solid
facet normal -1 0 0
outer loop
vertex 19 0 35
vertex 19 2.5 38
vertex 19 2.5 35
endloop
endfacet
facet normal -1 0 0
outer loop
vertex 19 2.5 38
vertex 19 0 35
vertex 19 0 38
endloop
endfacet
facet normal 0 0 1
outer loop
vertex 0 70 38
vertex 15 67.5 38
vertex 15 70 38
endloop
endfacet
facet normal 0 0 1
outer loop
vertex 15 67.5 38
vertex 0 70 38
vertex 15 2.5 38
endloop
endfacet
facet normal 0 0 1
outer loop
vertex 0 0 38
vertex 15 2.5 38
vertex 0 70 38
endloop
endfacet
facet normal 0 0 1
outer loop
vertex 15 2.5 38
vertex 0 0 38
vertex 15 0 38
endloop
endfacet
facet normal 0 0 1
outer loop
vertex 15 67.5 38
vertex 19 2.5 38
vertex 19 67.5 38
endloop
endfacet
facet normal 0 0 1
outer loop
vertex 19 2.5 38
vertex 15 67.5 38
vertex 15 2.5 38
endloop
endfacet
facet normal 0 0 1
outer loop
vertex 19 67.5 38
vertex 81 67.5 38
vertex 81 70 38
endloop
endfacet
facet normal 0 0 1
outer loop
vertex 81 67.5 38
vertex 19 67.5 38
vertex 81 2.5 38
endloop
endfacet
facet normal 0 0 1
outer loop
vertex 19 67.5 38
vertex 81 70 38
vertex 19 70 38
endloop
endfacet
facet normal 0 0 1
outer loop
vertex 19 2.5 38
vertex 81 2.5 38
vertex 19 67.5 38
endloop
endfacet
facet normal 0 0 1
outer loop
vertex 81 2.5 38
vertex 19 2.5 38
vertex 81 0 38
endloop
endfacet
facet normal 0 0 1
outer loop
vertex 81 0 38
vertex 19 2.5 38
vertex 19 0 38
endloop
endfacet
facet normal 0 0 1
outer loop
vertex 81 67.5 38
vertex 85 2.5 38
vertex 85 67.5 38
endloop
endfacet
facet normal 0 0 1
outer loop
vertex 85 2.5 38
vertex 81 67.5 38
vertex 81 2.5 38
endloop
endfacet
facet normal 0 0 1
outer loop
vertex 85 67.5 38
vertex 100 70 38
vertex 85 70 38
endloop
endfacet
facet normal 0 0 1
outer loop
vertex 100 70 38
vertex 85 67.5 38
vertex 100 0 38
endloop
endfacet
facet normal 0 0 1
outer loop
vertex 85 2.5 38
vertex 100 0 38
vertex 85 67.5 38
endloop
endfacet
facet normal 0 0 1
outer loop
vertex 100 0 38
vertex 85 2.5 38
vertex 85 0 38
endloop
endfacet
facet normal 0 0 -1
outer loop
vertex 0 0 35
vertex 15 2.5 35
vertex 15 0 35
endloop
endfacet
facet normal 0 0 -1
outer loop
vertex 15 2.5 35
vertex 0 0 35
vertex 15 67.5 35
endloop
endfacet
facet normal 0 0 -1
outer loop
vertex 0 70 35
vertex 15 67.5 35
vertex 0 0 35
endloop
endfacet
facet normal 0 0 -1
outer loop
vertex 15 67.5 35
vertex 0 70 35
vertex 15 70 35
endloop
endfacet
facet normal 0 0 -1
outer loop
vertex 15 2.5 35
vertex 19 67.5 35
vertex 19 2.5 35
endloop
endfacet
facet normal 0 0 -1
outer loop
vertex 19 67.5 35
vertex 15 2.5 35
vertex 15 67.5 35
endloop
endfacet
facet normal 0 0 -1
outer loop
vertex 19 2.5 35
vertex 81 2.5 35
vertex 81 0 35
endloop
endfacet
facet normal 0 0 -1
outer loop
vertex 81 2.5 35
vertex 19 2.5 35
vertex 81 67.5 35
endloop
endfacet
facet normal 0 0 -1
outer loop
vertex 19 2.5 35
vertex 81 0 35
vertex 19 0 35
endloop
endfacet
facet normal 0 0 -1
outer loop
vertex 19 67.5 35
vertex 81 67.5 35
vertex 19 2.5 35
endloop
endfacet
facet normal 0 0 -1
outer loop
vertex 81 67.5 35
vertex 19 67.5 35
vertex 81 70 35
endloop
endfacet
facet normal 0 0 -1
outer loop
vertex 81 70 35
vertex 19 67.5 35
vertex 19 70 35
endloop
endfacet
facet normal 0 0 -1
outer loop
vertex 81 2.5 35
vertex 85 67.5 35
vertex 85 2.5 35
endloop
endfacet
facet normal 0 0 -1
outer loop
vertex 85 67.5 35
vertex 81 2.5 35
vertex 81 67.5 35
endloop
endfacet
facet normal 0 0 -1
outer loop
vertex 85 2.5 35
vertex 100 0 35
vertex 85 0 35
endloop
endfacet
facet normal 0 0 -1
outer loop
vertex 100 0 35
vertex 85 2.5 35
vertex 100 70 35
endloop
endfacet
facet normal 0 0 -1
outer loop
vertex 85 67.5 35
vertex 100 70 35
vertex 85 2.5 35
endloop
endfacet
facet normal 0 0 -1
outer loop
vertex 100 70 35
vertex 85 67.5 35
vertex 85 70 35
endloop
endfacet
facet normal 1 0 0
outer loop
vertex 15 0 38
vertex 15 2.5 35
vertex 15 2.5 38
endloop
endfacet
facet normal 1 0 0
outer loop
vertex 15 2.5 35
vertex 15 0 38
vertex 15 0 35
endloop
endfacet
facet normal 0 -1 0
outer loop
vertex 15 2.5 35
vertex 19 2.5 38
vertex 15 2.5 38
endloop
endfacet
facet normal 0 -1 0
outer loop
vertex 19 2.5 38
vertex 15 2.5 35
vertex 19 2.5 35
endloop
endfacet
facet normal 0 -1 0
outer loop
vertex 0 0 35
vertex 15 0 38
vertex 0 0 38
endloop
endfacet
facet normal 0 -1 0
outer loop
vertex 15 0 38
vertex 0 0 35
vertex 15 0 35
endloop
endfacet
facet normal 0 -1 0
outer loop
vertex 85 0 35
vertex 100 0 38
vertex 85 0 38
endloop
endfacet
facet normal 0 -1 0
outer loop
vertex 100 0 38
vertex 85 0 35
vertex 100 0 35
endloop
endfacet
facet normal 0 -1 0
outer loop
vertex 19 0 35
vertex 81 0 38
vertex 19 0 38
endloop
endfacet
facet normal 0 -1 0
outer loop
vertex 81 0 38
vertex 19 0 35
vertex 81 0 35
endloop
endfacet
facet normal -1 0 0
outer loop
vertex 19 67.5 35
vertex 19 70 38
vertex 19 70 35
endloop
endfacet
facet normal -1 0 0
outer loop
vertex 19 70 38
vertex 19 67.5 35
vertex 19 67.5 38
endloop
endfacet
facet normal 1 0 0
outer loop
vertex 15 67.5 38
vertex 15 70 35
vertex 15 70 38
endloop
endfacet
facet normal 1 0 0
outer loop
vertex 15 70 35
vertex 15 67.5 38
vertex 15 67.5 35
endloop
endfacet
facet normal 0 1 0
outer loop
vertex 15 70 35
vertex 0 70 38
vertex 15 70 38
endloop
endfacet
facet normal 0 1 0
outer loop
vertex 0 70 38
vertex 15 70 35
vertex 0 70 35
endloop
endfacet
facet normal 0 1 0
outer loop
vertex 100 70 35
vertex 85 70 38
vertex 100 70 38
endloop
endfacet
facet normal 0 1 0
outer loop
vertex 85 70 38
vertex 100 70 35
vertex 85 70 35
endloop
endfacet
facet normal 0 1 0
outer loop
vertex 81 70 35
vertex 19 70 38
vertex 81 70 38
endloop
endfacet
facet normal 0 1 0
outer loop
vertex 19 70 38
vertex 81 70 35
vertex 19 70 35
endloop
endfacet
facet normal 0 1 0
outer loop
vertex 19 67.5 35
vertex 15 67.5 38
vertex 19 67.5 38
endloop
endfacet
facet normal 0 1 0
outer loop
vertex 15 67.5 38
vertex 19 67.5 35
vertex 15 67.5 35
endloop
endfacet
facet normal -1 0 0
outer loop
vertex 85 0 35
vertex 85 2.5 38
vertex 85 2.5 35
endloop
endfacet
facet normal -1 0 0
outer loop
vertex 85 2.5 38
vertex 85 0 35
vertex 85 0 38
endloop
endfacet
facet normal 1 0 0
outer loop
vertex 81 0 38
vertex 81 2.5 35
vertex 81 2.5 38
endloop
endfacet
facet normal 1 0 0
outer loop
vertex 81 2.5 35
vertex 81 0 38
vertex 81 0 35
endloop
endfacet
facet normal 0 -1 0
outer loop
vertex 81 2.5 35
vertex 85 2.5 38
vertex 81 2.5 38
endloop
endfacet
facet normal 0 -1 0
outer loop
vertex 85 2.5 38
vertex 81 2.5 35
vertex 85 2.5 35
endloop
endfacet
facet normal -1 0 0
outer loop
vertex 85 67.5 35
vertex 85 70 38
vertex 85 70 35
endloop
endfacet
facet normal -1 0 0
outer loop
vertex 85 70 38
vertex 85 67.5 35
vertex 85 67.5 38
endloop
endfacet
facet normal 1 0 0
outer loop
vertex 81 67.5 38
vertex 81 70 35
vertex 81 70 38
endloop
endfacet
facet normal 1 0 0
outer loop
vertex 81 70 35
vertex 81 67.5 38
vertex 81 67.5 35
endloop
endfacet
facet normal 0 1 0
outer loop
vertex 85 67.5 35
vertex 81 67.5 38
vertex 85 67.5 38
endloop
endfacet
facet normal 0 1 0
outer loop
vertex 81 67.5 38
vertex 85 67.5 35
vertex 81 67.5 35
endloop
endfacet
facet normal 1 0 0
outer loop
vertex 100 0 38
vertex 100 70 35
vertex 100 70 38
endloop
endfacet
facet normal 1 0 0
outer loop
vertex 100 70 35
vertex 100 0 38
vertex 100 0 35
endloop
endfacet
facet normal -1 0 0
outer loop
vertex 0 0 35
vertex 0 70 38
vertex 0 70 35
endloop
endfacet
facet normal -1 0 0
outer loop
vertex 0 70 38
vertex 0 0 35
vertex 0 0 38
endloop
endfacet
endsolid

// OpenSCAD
// Deckel mit Rastöffnungen für Einrasthaken

case_l = 100;
case_w = 70;
case_h = 35;
lid_thickness = 3;

hook_w = 4;
hook_d = 2;
hole_clearance = 0.5;

module lid_with_holes() {
    difference() {
        // Deckelplatte
        translate([0, 0, case_h])
            cube([case_l, case_w, lid_thickness]);

        // Rastöffnungen
        for (x = [15, case_l - 19]) {
            // vorne
            translate([x, 0, case_h])
                cube([hook_w, hook_d + hole_clearance, lid_thickness]);
            // hinten
            translate([x, case_w - hook_d - hole_clearance, case_h])
                cube([hook_w, hook_d + hole_clearance, lid_thickness]);
        }
    }
}

lid_with_holes();
